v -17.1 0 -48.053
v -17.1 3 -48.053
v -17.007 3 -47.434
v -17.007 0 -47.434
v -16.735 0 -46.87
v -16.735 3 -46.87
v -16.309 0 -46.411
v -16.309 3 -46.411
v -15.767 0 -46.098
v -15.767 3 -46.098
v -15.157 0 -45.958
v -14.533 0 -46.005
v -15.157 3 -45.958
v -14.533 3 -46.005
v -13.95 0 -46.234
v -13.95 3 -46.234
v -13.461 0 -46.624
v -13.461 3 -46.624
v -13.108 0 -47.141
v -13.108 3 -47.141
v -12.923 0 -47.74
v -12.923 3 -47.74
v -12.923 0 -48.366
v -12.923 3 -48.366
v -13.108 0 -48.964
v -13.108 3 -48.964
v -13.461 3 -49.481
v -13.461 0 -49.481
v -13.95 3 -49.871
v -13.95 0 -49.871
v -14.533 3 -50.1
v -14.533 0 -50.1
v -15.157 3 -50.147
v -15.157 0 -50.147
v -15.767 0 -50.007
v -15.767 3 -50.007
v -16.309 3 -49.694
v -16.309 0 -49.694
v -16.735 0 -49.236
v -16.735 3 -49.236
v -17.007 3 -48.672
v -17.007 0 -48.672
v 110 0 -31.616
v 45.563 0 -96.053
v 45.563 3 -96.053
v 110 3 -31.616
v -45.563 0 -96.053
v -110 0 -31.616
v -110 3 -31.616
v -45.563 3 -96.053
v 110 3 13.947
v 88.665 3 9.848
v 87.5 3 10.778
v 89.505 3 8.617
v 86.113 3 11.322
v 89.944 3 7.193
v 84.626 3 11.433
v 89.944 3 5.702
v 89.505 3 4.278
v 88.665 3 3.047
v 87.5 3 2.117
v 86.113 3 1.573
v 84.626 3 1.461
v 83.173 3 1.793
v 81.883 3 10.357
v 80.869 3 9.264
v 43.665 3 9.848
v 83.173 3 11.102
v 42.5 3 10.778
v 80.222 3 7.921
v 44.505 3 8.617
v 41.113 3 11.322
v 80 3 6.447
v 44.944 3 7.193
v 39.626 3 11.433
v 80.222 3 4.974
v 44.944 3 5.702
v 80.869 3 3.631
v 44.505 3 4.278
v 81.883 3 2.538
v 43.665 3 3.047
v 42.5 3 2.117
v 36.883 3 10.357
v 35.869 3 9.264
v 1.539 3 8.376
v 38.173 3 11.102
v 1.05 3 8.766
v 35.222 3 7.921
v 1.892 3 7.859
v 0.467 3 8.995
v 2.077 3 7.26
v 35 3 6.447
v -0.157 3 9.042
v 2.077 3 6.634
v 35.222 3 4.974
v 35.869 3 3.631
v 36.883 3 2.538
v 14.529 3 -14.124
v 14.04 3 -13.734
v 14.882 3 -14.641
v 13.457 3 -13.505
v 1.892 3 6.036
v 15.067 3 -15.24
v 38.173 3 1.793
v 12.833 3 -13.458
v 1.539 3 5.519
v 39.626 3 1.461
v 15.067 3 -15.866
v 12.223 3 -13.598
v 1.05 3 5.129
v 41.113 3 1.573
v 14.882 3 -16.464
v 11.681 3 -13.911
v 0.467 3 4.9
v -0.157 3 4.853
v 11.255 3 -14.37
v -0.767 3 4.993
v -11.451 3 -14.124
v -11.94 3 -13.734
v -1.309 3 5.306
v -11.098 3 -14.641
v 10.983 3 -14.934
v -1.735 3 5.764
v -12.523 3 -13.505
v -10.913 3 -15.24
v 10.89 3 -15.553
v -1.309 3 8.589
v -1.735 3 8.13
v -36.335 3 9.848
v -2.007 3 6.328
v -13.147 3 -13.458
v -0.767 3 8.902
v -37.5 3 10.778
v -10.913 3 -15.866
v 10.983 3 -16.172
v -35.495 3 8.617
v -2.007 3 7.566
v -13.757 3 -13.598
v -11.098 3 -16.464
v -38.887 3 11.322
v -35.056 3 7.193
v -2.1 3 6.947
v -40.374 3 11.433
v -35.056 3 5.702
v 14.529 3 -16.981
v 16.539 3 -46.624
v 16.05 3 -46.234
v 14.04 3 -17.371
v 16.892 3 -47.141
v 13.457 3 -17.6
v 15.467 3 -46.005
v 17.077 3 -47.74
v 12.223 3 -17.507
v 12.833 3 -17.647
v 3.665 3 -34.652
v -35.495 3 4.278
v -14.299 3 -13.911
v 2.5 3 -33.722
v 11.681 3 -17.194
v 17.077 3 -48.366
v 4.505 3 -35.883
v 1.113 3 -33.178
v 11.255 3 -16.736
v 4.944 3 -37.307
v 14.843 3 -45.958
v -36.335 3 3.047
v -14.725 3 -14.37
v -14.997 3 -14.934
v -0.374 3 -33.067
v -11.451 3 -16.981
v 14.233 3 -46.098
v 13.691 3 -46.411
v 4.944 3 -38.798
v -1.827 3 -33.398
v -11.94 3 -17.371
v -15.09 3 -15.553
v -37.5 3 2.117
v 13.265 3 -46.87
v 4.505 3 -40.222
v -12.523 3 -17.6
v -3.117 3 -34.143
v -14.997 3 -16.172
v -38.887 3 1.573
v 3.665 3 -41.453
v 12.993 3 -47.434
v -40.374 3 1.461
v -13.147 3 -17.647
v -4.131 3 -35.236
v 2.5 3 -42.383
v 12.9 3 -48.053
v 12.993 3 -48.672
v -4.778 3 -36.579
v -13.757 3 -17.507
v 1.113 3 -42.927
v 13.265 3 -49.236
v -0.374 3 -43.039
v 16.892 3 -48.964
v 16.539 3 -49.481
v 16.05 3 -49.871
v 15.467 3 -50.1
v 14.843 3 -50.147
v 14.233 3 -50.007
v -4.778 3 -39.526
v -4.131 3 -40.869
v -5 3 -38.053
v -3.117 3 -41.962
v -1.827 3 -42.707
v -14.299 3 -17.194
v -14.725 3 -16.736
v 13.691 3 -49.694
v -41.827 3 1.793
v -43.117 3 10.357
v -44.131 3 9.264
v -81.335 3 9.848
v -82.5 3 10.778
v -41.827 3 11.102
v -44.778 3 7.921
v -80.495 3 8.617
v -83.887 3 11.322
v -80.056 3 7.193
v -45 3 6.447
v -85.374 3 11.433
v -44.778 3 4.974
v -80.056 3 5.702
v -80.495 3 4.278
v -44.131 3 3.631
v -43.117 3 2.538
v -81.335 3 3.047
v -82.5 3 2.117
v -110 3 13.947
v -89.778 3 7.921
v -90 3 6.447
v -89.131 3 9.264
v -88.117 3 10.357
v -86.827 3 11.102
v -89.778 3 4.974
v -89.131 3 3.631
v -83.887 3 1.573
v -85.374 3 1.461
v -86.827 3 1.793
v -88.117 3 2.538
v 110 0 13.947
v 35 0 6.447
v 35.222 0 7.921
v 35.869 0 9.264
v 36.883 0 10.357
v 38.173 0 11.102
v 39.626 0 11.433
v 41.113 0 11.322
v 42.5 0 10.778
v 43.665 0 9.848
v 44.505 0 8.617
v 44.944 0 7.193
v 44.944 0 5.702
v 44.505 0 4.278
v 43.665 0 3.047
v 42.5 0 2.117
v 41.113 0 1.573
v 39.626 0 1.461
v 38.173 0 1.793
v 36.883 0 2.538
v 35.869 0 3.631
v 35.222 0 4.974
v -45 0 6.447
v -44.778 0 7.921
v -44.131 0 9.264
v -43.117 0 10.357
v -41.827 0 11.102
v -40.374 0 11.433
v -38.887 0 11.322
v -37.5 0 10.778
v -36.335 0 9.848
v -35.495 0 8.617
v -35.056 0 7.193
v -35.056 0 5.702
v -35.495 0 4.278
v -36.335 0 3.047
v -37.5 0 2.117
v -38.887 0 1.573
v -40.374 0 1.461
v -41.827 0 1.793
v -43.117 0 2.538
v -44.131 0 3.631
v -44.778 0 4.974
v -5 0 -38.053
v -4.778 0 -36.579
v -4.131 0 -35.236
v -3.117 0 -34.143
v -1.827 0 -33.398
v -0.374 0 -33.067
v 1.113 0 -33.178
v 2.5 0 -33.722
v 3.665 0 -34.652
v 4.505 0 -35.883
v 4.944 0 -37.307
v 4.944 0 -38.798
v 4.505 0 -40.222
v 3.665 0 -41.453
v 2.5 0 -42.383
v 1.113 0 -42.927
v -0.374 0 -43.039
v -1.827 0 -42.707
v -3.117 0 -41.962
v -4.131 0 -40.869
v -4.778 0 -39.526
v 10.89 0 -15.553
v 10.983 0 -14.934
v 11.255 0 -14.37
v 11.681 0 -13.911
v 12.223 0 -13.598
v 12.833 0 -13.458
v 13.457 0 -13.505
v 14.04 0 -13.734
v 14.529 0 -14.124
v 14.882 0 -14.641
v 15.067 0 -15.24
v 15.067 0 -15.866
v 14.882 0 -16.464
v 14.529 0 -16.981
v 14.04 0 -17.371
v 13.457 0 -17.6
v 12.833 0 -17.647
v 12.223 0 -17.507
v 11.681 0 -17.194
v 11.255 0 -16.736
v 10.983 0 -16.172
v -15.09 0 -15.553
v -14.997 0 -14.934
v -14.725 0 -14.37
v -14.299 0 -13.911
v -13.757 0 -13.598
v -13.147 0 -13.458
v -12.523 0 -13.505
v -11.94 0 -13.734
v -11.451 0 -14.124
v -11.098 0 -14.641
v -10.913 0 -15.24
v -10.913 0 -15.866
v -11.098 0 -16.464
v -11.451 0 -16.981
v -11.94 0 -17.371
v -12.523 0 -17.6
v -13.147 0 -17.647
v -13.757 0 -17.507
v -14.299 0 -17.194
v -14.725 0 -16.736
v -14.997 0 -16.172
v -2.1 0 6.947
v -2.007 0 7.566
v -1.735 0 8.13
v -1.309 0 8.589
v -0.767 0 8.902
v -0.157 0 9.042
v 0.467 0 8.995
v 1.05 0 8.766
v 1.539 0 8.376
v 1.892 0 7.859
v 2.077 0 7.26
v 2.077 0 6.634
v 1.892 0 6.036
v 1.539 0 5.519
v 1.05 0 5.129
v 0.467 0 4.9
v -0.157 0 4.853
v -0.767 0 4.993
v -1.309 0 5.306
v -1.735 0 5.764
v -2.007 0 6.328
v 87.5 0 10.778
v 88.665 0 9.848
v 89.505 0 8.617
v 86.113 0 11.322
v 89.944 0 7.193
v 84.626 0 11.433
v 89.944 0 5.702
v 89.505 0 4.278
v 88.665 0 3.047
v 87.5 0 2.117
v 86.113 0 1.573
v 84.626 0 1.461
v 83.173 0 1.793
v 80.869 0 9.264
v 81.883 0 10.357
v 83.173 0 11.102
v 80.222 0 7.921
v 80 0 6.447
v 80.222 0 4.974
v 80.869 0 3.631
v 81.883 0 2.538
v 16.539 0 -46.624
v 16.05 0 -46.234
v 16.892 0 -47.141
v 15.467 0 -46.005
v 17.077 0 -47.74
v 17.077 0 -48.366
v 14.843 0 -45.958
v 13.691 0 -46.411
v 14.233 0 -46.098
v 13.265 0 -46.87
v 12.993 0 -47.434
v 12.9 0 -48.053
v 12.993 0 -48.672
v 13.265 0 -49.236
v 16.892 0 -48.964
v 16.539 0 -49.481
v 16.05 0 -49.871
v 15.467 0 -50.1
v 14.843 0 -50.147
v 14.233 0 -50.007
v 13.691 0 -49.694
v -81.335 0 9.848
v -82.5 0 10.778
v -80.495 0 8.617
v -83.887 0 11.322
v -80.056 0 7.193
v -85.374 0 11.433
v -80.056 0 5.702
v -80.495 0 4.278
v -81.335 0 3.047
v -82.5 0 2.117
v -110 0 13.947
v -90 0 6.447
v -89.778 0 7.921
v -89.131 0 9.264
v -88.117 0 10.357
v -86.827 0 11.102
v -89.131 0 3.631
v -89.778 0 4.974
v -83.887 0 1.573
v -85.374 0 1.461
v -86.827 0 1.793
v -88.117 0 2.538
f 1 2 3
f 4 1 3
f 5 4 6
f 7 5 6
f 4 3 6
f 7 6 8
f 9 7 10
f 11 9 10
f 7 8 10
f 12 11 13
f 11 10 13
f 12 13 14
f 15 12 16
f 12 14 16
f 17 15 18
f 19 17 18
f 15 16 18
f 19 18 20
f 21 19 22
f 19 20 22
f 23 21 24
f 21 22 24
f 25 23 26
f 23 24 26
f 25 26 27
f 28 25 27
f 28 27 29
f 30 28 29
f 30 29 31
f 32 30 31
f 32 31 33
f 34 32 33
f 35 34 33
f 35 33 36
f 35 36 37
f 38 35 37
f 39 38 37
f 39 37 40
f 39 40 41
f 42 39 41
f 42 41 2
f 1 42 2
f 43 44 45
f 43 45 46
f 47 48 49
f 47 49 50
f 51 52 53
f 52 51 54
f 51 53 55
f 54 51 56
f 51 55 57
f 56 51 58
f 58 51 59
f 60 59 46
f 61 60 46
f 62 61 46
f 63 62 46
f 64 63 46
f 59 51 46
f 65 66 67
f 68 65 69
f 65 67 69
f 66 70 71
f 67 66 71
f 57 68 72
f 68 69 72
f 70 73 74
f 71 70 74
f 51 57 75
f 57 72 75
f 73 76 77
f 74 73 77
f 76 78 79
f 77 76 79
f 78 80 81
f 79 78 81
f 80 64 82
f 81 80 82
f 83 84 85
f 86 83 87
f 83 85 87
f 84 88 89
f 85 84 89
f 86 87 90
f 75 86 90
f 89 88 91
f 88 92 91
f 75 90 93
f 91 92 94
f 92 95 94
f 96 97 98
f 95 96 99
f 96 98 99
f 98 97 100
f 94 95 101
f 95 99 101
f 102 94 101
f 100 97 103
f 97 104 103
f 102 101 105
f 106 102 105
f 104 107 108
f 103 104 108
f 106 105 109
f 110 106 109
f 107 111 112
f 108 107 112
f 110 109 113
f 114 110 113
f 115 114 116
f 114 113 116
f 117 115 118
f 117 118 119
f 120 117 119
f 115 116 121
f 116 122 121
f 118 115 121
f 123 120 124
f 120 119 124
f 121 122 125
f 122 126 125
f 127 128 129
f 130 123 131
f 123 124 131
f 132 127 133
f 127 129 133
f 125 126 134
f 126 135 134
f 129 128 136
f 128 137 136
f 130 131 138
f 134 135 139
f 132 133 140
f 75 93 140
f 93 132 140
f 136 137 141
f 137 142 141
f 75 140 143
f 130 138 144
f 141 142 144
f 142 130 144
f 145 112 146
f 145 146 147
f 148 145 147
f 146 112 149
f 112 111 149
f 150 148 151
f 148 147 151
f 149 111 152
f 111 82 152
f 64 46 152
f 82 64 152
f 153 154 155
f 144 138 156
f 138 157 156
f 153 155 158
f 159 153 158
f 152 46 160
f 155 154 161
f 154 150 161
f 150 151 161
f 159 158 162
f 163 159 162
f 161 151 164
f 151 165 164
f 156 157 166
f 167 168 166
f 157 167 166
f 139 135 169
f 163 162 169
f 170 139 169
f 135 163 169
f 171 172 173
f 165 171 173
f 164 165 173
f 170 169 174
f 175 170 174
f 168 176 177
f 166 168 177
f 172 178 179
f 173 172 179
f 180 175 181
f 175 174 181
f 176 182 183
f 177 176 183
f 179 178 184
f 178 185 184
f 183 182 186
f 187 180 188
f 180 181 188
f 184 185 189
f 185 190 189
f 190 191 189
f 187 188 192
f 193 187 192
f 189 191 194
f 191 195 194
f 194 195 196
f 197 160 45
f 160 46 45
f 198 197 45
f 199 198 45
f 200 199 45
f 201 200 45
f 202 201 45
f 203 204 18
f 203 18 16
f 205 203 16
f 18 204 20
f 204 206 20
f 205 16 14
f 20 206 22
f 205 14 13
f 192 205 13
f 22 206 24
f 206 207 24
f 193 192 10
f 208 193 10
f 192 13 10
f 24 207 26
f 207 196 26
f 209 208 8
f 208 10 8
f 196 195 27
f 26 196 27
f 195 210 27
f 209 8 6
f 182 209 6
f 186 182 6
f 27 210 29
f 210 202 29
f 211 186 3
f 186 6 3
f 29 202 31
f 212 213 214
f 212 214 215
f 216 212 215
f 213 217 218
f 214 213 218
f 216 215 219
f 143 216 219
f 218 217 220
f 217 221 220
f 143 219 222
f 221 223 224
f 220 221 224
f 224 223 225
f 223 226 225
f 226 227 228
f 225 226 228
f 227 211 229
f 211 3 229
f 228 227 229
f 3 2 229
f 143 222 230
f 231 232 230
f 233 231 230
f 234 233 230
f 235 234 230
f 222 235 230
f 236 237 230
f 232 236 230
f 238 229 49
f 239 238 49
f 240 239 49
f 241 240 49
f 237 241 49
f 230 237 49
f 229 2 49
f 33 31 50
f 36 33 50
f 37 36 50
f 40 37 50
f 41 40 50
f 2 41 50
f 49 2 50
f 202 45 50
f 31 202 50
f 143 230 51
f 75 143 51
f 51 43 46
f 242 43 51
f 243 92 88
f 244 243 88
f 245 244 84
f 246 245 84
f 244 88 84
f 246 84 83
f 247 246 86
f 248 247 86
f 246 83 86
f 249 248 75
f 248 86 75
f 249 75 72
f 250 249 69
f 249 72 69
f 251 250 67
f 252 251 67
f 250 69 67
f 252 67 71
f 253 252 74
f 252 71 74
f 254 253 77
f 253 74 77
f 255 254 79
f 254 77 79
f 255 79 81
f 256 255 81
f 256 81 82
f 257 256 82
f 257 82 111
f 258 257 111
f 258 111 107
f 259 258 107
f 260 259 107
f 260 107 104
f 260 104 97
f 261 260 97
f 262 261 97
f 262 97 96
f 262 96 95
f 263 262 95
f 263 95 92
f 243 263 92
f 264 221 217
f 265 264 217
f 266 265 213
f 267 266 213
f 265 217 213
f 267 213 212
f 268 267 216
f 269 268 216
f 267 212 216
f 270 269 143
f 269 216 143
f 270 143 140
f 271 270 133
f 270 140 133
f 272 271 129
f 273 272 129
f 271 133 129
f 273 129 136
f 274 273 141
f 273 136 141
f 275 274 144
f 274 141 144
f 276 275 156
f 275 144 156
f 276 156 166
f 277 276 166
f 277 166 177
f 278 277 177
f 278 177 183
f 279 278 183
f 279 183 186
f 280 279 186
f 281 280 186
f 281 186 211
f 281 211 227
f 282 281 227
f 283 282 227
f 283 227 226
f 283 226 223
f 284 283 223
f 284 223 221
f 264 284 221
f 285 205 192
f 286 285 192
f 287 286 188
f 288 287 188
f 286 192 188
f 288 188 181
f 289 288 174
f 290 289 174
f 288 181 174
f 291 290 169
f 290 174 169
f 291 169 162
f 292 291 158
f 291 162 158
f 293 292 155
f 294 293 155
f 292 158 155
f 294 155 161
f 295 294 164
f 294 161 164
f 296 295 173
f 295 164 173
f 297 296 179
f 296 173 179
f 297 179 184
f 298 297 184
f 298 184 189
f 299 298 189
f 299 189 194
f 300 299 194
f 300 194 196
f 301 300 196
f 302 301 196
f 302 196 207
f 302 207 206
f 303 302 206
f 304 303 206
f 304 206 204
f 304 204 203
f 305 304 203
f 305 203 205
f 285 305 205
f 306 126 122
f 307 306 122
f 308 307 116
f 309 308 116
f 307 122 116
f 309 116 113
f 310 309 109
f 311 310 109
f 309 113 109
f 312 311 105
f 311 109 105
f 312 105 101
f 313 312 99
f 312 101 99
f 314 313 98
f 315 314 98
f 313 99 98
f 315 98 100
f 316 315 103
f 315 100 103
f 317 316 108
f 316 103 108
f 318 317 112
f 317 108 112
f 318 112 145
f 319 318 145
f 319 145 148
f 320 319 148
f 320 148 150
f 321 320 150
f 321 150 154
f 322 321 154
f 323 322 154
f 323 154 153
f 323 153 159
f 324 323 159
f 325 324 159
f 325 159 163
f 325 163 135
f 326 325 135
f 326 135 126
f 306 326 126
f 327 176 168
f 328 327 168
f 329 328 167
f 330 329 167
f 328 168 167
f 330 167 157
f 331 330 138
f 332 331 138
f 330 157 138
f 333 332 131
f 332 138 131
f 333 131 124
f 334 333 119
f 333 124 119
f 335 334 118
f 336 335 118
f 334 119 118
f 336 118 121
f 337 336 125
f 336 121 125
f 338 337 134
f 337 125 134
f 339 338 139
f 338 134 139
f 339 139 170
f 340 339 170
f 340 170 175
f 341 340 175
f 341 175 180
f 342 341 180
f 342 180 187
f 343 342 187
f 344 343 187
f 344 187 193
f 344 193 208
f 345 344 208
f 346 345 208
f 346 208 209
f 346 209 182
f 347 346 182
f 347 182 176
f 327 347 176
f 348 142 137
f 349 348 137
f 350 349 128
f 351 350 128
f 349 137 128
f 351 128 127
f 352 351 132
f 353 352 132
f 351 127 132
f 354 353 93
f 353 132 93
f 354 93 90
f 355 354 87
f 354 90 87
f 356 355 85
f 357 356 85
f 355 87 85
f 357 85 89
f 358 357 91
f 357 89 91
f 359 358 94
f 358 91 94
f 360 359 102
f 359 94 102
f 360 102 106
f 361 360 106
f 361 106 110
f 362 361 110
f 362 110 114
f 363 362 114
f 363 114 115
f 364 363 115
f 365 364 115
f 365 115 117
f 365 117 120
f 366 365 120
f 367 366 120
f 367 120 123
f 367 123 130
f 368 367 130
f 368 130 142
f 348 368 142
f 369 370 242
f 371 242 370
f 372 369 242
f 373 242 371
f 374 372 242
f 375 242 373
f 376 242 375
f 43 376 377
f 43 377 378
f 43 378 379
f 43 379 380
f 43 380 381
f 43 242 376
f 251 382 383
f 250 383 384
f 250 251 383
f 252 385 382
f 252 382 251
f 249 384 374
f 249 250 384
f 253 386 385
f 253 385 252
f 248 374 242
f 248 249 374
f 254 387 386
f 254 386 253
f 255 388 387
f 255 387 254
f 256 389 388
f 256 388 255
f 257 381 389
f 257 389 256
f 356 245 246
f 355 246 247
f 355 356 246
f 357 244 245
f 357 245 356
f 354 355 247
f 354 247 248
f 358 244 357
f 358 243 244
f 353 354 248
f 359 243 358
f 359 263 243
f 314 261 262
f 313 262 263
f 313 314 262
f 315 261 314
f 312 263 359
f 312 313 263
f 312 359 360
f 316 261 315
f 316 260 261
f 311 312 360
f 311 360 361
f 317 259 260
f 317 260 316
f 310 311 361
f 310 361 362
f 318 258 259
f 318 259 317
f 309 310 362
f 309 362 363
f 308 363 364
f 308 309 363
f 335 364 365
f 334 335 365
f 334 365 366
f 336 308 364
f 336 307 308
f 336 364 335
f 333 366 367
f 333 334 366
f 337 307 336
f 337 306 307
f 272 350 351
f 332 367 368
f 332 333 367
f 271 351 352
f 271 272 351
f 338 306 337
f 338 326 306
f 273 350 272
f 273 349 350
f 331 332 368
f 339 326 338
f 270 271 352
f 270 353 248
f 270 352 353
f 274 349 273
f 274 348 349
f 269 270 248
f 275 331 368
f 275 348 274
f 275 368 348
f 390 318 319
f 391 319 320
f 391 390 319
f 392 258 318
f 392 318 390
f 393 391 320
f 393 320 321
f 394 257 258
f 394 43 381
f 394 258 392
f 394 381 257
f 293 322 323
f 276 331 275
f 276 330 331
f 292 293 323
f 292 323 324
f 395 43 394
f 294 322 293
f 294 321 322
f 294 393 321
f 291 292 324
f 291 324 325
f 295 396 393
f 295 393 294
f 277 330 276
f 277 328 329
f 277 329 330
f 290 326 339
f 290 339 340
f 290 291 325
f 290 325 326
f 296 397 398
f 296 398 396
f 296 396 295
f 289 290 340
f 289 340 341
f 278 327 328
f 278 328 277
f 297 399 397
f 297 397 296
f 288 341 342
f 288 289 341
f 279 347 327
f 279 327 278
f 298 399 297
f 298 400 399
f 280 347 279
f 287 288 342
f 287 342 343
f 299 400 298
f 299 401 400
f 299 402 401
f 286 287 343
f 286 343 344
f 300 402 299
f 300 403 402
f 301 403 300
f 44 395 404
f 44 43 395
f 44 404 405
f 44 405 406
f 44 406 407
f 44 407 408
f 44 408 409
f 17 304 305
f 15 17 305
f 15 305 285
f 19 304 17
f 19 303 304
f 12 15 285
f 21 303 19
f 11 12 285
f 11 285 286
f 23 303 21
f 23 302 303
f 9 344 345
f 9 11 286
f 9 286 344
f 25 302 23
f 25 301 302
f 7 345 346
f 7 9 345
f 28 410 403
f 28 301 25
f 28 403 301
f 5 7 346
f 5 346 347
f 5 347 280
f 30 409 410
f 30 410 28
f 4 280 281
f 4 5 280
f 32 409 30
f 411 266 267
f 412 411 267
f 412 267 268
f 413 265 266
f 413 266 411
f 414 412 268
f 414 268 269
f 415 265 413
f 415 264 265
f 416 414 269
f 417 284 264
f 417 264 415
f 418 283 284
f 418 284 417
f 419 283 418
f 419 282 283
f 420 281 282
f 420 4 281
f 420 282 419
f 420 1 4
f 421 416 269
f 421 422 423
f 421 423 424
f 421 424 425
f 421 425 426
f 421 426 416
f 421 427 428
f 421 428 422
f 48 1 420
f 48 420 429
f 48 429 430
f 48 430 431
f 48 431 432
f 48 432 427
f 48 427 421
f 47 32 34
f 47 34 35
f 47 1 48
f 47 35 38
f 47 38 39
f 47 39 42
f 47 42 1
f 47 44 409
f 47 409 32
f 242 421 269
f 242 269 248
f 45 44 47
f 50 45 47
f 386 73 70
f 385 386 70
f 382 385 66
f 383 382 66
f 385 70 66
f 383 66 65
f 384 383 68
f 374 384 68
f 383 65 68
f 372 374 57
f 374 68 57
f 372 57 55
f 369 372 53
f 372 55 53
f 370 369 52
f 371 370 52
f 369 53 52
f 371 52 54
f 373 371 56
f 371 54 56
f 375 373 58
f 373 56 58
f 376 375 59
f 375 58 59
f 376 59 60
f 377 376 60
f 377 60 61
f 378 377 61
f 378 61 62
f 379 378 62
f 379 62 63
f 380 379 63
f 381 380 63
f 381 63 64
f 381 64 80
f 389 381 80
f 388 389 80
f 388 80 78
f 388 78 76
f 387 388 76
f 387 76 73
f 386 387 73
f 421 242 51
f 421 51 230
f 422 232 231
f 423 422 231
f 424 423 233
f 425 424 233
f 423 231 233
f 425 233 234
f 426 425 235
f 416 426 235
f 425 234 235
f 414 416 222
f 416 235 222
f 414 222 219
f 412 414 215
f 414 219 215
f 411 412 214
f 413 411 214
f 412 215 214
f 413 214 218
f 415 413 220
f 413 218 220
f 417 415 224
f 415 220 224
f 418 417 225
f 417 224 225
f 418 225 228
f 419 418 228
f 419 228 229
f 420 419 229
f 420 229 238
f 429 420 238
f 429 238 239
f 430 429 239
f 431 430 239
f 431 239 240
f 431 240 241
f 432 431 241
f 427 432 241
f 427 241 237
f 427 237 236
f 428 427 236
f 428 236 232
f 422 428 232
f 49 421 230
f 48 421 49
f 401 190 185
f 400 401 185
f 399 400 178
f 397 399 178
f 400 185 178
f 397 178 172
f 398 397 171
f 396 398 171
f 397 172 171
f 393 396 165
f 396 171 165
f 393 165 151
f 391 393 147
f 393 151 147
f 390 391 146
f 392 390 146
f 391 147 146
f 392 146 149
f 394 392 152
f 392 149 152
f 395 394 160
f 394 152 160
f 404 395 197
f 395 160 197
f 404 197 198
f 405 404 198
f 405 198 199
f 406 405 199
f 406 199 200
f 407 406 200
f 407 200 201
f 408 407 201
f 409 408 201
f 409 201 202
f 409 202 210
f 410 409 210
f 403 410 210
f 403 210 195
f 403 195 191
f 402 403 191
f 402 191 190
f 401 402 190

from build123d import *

# Parameters (mm, degrees)
EXTRUDE1_DEPTH     = 3
SKETCH2_R          = 5
CUT_EXTRUDE1_DEPTH = 4
SKETCH7_R          = 5
CUT_EXTRUDE6_DEPTH = 4
SKETCH8_R          = 2.1
CUT_EXTRUDE7_DEPTH = 4


with BuildPart() as part:
    # Sketch1 → Extrude1 (new body)
    with BuildSketch(Plane(origin=(0, 0, 0), x_dir=(1, 0, 0), z_dir=(0, 1, 0))):
        Polygon((-110, -13.947380088), (-110, 31.616111773), (-45.563491861, 96.052619912), (0, 96.052619912), (45.563491861, 96.052619912), (110, 31.616111773), (110, -13.947380088), align=None)
    extrude(amount=EXTRUDE1_DEPTH)

    # Sketch2 → Cut-Extrude1 (cut, through all)
    with BuildSketch(Plane(origin=(0, 3, 0), x_dir=(-1, 0, 0), z_dir=(0, 1, 0))):
        with Locations((85, 6.447380088)):
            Circle(SKETCH2_R)
        with Locations((40, 6.447380088)):
            Circle(SKETCH2_R)
        with Locations((-40, 6.447380088)):
            Circle(SKETCH2_R)
        with Locations((-85, 6.447380088)):
            Circle(SKETCH2_R)
    extrude(amount=-CUT_EXTRUDE1_DEPTH, mode=Mode.SUBTRACT)

    # Sketch7 → Cut-Extrude6 (cut, through all)
    with BuildSketch(Plane(origin=(0, 3, 0), x_dir=(-1, 0, 0), z_dir=(0, 1, 0))):
        with Locations((0, -38.052619912)):
            Circle(SKETCH7_R)
    extrude(amount=-CUT_EXTRUDE6_DEPTH, mode=Mode.SUBTRACT)

    # Sketch8 → Cut-Extrude7 (cut, through all)
    with BuildSketch(Plane(origin=(49.267366711, 3, 2.671437264), x_dir=(-1, 0, 0), z_dir=(0, 1, 0))):
        with Locations((64.267366711, -50.724057176)):
            Circle(SKETCH8_R)
        with Locations((34.267366711, -50.724057176)):
            Circle(SKETCH8_R)
        with Locations((36.277366711, -18.224057176)):
            Circle(SKETCH8_R)
        with Locations((62.257366711, -18.224057176)):
            Circle(SKETCH8_R)
        with Locations((49.267366711, 4.275942824)):
            Circle(SKETCH8_R)
    extrude(amount=-CUT_EXTRUDE7_DEPTH, mode=Mode.SUBTRACT)


solid = part.part
